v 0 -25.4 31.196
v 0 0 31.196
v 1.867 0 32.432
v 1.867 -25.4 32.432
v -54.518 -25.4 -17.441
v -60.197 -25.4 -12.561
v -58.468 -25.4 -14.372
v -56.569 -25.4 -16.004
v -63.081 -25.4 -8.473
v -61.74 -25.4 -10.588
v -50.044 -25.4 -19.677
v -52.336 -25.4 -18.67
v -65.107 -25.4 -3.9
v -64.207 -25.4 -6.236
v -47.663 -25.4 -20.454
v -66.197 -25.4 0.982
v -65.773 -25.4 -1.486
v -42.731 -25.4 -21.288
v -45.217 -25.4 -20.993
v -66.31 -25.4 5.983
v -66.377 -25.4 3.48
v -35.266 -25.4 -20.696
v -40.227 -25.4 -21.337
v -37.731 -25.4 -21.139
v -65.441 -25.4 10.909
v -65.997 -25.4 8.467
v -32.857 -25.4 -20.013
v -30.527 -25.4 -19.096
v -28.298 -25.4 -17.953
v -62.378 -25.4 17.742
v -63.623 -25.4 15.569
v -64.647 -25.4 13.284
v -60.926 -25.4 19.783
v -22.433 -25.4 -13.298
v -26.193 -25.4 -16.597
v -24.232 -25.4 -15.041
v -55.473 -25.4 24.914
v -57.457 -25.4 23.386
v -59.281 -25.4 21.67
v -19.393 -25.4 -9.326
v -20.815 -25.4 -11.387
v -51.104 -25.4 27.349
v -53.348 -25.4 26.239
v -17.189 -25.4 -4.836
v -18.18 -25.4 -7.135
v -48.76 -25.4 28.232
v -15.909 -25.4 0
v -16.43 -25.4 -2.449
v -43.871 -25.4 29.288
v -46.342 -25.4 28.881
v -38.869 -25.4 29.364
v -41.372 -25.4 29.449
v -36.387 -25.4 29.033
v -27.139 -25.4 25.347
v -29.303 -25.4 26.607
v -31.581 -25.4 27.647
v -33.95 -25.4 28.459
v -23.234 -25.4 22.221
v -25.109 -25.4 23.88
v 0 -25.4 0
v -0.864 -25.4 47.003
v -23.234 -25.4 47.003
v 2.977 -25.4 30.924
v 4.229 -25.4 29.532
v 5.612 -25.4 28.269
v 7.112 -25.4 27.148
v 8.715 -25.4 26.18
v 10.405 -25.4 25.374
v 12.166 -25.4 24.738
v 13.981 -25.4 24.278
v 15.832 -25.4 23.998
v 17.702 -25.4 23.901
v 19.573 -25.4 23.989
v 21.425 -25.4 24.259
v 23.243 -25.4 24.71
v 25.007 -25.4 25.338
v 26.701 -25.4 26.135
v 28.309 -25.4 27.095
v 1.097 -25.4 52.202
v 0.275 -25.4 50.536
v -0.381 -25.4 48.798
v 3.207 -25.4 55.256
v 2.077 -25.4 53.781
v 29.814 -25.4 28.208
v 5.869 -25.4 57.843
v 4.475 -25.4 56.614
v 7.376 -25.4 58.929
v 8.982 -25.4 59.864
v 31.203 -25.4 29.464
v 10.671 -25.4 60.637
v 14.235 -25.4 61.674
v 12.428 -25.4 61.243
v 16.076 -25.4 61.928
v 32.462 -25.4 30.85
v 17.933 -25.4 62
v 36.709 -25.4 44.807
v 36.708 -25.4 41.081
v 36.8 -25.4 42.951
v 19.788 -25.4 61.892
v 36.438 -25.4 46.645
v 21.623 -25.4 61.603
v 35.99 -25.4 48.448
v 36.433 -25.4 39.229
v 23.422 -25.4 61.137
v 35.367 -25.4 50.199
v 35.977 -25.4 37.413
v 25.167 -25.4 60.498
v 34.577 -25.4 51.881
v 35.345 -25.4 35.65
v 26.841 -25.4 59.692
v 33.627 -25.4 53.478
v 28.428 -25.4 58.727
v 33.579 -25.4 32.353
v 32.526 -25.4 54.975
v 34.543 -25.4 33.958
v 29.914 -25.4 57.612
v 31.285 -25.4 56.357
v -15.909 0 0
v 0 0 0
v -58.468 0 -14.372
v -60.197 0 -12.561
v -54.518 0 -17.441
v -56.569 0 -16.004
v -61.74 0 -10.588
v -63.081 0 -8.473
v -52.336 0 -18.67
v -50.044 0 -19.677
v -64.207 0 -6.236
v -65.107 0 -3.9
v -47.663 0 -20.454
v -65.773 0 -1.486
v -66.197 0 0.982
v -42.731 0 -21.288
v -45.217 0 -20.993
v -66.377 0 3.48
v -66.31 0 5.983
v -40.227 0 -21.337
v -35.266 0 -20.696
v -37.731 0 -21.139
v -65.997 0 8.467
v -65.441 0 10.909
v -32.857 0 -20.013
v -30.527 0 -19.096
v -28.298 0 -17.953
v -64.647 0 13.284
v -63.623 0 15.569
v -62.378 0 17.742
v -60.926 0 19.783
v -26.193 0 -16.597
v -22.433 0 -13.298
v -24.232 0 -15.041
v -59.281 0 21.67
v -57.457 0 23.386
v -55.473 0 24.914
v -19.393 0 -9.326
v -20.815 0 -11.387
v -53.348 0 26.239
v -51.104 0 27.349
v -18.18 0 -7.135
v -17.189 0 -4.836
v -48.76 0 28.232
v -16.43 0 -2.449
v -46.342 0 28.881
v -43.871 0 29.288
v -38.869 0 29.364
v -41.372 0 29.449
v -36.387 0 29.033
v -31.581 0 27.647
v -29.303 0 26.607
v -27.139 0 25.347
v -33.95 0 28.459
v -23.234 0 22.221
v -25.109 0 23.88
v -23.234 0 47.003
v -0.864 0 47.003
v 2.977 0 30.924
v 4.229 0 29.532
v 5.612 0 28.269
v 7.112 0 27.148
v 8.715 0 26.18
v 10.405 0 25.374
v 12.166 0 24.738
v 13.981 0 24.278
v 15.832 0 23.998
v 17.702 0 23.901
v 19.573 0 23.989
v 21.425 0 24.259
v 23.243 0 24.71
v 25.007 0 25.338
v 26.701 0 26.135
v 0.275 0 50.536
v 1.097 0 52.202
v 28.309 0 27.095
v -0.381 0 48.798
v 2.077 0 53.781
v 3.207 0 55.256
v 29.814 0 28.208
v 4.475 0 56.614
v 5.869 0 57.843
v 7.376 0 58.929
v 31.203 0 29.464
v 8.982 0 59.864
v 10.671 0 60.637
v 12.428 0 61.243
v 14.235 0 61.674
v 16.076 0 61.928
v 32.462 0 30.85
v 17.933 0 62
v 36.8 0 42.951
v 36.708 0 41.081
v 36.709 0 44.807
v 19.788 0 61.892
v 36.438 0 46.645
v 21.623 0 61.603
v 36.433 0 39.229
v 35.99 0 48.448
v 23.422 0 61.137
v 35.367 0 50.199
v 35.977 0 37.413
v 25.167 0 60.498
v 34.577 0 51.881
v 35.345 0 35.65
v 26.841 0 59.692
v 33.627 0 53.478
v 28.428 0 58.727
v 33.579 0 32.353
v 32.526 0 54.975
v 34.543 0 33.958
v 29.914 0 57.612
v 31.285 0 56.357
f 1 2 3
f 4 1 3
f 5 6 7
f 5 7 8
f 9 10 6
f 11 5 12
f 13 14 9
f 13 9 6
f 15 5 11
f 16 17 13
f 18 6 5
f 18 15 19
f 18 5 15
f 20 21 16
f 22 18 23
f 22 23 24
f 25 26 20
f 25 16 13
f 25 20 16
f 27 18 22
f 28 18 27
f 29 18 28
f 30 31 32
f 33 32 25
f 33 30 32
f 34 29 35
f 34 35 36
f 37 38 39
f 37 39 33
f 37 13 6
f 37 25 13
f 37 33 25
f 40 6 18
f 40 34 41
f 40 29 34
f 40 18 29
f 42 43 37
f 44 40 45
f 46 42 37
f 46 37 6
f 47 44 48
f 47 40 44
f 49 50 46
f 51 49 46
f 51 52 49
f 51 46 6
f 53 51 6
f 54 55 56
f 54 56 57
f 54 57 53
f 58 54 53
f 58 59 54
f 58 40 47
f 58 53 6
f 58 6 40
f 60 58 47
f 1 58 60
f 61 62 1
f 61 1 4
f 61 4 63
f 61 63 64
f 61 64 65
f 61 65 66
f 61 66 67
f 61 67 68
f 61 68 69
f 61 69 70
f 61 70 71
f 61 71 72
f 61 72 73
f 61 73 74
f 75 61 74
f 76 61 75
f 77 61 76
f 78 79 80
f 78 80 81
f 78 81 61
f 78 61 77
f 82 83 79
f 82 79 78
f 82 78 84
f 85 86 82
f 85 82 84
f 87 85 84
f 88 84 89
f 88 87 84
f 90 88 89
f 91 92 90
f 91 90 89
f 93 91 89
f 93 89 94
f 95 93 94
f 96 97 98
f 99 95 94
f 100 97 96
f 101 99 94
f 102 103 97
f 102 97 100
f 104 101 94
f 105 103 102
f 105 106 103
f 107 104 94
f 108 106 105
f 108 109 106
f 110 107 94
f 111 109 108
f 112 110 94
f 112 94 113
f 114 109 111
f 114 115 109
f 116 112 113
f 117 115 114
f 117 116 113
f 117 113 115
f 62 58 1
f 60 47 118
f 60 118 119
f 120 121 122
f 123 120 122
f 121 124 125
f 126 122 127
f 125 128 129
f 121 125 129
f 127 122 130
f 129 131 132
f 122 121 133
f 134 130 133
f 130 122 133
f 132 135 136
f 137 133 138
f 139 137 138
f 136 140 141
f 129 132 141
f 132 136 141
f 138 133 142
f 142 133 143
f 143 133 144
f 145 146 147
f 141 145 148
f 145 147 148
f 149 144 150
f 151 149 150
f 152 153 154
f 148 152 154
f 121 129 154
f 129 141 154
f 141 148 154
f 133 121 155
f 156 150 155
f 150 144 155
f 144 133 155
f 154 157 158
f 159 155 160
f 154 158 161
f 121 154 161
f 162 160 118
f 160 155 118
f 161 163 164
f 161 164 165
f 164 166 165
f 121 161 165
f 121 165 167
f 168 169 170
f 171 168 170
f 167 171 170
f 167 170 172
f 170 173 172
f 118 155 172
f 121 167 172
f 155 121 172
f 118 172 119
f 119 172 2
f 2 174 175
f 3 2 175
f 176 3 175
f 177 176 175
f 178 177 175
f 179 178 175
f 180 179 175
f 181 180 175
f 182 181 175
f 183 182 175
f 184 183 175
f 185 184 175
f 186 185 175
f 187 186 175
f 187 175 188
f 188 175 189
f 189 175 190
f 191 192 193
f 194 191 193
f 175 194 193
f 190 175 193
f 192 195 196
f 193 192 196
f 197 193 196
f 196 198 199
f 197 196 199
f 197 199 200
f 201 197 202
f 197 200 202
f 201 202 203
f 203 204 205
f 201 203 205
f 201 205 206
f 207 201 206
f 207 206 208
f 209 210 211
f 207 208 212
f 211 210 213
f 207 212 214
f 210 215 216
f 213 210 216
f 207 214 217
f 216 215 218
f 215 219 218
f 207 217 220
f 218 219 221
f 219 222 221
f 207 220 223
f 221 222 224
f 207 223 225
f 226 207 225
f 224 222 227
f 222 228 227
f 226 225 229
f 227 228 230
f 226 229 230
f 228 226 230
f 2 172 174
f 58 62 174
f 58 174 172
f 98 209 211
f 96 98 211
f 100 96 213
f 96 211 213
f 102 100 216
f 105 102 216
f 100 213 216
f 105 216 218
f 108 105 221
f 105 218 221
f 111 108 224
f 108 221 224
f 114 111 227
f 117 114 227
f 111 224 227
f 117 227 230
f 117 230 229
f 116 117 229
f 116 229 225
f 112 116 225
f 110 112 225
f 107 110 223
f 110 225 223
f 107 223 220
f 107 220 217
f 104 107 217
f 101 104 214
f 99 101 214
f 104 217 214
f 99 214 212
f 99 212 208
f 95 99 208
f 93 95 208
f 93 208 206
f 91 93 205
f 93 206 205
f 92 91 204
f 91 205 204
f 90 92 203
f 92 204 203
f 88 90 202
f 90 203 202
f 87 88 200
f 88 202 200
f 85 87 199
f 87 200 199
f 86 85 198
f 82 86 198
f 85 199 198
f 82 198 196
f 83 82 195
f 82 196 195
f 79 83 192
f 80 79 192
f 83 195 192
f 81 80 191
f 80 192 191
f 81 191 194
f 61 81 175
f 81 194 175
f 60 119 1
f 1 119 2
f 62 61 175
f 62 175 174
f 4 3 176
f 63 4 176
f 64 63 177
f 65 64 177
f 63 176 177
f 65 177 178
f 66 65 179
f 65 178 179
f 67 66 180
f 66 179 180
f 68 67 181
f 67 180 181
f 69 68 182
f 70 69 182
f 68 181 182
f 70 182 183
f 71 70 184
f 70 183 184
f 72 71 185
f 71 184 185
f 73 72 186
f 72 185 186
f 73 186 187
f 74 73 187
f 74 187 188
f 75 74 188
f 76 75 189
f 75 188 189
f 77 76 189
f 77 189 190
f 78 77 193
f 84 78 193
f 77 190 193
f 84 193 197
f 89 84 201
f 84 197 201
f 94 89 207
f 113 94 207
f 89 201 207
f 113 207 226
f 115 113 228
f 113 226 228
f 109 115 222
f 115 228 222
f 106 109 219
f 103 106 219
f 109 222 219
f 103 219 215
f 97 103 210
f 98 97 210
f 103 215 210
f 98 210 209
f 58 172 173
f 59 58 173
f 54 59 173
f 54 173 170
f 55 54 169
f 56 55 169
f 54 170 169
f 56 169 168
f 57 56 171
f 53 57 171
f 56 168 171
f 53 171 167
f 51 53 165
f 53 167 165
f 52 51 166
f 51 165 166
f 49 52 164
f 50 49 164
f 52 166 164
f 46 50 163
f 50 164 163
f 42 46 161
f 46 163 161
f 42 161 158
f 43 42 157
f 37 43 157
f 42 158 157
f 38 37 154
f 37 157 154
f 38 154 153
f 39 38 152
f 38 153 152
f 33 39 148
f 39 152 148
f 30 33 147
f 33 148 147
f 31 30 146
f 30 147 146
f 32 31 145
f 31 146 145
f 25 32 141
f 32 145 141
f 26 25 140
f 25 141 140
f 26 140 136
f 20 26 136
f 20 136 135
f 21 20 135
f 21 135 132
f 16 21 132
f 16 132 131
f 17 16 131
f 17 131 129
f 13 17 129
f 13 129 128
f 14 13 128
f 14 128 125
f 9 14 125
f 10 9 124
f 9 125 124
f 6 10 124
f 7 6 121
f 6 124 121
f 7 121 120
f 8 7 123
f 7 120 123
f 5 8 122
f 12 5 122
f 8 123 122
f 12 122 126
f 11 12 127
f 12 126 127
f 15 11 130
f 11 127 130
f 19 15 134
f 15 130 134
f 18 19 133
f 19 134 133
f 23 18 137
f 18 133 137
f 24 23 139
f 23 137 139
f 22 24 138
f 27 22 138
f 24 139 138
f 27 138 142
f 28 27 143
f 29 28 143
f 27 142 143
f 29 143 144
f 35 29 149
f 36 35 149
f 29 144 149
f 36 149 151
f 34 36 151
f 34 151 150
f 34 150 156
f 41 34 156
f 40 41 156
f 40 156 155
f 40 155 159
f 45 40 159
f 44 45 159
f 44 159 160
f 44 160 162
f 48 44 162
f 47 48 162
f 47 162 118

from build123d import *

# Parameters (mm, degrees)
F1_DEPTH = 25.4


with BuildPart() as f1:
    # F0 (on Front) → F1 (new body)
    with BuildSketch(Plane.XZ):
        with BuildLine():
            ThreePointArc((1.8673827959, 32.4323775117), (23.2426437423, 24.7104189311), (36.799872741, 42.9513609771))
            ThreePointArc((36.799872741, 42.9513609771), (19.7876276974, 61.892059347), (-0.8641750005, 47.0034871694))
            Line((-0.8641750005, 47.0034871694), (0, 47.0034871694))
            Line((0, 47.0034871694), (0, 36.0343878183))
            ThreePointArc((0, 36.0343878183), (0.8375229775, 34.1835262685), (1.8673827959, 32.4323775117))
        make_face()
        with BuildLine():
            Line((0, 47.0034871694), (-0.8641750005, 47.0034871694))
            ThreePointArc((-0.8641750005, 47.0034871694), (-1.2412821306, 41.4551869754), (0, 36.0343878183))
            Line((0, 36.0343878183), (0, 47.0034871694))
        make_face()
        with BuildLine():
            ThreePointArc((0, 36.0343878183), (-1.2412821306, 41.4551869754), (-0.8641750005, 47.0034871694))
            Line((-0.8641750005, 47.0034871694), (-23.2337535647, 47.0034871694))
            Line((-23.2337535647, 47.0034871694), (-23.2337535647, 22.2208360441))
            ThreePointArc((-23.2337535647, 22.2208360441), (-21.4104164375, 20.2400678606), (-19.8069730457, 18.0774374795))
            Line((-19.8069730457, 18.0774374795), (0, 31.1956086661))
            Line((0, 31.1956086661), (0, 36.0343878183))
        make_face()
        with BuildLine():
            Line((0, 31.1956086661), (1.8673827959, 32.4323775117))
            ThreePointArc((1.8673827959, 32.4323775117), (0.8375229775, 34.1835262685), (0, 36.0343878183))
            Line((0, 36.0343878183), (0, 31.1956086661))
        make_face()
        with BuildLine():
            Line((0, 0), (0, 31.1956086661))
            Line((0, 31.1956086661), (-19.8069730457, 18.0774374795))
            ThreePointArc((-19.8069730457, 18.0774374795), (-16.6623702443, 11.3758208608), (-15.5836263057, 4.0521261923))
            ThreePointArc((-15.5836263057, 4.0521261923), (-15.6650834504, 2.0195446596), (-15.9089324228, 0))
            Line((-15.9089324228, 0), (0, 0))
        make_face()
        with BuildLine():
            Line((-23.2337535647, 15.8078785033), (-23.2337535647, 22.2208360441))
            ThreePointArc((-23.2337535647, 22.2208360441), (-65.1067949461, -3.8997751366), (-15.9089324228, 0))
            Line((-15.9089324228, 0), (-23.2337535647, 0))
            Line((-23.2337535647, 0), (-23.2337535647, 15.8078785033))
        make_face()
        with BuildLine():
            ThreePointArc((-19.8069730457, 18.0774374795), (-21.4104164375, 20.2400678606), (-23.2337535647, 22.2208360441))
            Line((-23.2337535647, 22.2208360441), (-23.2337535647, 15.8078785033))
            Line((-23.2337535647, 15.8078785033), (-19.8069730457, 18.0774374795))
        make_face()
        with BuildLine():
            ThreePointArc((-15.5836263057, 4.0521261923), (-16.6623702443, 11.3758208608), (-19.8069730457, 18.0774374795))
            Line((-19.8069730457, 18.0774374795), (-23.2337535647, 15.8078785033))
            Line((-23.2337535647, 15.8078785033), (-23.2337535647, 0))
            Line((-23.2337535647, 0), (-15.9089324228, 0))
            ThreePointArc((-15.9089324228, 0), (-15.6650834504, 2.0195446596), (-15.5836263057, 4.0521261923))
        make_face()
    extrude(amount=F1_DEPTH)


solid = f1.part
